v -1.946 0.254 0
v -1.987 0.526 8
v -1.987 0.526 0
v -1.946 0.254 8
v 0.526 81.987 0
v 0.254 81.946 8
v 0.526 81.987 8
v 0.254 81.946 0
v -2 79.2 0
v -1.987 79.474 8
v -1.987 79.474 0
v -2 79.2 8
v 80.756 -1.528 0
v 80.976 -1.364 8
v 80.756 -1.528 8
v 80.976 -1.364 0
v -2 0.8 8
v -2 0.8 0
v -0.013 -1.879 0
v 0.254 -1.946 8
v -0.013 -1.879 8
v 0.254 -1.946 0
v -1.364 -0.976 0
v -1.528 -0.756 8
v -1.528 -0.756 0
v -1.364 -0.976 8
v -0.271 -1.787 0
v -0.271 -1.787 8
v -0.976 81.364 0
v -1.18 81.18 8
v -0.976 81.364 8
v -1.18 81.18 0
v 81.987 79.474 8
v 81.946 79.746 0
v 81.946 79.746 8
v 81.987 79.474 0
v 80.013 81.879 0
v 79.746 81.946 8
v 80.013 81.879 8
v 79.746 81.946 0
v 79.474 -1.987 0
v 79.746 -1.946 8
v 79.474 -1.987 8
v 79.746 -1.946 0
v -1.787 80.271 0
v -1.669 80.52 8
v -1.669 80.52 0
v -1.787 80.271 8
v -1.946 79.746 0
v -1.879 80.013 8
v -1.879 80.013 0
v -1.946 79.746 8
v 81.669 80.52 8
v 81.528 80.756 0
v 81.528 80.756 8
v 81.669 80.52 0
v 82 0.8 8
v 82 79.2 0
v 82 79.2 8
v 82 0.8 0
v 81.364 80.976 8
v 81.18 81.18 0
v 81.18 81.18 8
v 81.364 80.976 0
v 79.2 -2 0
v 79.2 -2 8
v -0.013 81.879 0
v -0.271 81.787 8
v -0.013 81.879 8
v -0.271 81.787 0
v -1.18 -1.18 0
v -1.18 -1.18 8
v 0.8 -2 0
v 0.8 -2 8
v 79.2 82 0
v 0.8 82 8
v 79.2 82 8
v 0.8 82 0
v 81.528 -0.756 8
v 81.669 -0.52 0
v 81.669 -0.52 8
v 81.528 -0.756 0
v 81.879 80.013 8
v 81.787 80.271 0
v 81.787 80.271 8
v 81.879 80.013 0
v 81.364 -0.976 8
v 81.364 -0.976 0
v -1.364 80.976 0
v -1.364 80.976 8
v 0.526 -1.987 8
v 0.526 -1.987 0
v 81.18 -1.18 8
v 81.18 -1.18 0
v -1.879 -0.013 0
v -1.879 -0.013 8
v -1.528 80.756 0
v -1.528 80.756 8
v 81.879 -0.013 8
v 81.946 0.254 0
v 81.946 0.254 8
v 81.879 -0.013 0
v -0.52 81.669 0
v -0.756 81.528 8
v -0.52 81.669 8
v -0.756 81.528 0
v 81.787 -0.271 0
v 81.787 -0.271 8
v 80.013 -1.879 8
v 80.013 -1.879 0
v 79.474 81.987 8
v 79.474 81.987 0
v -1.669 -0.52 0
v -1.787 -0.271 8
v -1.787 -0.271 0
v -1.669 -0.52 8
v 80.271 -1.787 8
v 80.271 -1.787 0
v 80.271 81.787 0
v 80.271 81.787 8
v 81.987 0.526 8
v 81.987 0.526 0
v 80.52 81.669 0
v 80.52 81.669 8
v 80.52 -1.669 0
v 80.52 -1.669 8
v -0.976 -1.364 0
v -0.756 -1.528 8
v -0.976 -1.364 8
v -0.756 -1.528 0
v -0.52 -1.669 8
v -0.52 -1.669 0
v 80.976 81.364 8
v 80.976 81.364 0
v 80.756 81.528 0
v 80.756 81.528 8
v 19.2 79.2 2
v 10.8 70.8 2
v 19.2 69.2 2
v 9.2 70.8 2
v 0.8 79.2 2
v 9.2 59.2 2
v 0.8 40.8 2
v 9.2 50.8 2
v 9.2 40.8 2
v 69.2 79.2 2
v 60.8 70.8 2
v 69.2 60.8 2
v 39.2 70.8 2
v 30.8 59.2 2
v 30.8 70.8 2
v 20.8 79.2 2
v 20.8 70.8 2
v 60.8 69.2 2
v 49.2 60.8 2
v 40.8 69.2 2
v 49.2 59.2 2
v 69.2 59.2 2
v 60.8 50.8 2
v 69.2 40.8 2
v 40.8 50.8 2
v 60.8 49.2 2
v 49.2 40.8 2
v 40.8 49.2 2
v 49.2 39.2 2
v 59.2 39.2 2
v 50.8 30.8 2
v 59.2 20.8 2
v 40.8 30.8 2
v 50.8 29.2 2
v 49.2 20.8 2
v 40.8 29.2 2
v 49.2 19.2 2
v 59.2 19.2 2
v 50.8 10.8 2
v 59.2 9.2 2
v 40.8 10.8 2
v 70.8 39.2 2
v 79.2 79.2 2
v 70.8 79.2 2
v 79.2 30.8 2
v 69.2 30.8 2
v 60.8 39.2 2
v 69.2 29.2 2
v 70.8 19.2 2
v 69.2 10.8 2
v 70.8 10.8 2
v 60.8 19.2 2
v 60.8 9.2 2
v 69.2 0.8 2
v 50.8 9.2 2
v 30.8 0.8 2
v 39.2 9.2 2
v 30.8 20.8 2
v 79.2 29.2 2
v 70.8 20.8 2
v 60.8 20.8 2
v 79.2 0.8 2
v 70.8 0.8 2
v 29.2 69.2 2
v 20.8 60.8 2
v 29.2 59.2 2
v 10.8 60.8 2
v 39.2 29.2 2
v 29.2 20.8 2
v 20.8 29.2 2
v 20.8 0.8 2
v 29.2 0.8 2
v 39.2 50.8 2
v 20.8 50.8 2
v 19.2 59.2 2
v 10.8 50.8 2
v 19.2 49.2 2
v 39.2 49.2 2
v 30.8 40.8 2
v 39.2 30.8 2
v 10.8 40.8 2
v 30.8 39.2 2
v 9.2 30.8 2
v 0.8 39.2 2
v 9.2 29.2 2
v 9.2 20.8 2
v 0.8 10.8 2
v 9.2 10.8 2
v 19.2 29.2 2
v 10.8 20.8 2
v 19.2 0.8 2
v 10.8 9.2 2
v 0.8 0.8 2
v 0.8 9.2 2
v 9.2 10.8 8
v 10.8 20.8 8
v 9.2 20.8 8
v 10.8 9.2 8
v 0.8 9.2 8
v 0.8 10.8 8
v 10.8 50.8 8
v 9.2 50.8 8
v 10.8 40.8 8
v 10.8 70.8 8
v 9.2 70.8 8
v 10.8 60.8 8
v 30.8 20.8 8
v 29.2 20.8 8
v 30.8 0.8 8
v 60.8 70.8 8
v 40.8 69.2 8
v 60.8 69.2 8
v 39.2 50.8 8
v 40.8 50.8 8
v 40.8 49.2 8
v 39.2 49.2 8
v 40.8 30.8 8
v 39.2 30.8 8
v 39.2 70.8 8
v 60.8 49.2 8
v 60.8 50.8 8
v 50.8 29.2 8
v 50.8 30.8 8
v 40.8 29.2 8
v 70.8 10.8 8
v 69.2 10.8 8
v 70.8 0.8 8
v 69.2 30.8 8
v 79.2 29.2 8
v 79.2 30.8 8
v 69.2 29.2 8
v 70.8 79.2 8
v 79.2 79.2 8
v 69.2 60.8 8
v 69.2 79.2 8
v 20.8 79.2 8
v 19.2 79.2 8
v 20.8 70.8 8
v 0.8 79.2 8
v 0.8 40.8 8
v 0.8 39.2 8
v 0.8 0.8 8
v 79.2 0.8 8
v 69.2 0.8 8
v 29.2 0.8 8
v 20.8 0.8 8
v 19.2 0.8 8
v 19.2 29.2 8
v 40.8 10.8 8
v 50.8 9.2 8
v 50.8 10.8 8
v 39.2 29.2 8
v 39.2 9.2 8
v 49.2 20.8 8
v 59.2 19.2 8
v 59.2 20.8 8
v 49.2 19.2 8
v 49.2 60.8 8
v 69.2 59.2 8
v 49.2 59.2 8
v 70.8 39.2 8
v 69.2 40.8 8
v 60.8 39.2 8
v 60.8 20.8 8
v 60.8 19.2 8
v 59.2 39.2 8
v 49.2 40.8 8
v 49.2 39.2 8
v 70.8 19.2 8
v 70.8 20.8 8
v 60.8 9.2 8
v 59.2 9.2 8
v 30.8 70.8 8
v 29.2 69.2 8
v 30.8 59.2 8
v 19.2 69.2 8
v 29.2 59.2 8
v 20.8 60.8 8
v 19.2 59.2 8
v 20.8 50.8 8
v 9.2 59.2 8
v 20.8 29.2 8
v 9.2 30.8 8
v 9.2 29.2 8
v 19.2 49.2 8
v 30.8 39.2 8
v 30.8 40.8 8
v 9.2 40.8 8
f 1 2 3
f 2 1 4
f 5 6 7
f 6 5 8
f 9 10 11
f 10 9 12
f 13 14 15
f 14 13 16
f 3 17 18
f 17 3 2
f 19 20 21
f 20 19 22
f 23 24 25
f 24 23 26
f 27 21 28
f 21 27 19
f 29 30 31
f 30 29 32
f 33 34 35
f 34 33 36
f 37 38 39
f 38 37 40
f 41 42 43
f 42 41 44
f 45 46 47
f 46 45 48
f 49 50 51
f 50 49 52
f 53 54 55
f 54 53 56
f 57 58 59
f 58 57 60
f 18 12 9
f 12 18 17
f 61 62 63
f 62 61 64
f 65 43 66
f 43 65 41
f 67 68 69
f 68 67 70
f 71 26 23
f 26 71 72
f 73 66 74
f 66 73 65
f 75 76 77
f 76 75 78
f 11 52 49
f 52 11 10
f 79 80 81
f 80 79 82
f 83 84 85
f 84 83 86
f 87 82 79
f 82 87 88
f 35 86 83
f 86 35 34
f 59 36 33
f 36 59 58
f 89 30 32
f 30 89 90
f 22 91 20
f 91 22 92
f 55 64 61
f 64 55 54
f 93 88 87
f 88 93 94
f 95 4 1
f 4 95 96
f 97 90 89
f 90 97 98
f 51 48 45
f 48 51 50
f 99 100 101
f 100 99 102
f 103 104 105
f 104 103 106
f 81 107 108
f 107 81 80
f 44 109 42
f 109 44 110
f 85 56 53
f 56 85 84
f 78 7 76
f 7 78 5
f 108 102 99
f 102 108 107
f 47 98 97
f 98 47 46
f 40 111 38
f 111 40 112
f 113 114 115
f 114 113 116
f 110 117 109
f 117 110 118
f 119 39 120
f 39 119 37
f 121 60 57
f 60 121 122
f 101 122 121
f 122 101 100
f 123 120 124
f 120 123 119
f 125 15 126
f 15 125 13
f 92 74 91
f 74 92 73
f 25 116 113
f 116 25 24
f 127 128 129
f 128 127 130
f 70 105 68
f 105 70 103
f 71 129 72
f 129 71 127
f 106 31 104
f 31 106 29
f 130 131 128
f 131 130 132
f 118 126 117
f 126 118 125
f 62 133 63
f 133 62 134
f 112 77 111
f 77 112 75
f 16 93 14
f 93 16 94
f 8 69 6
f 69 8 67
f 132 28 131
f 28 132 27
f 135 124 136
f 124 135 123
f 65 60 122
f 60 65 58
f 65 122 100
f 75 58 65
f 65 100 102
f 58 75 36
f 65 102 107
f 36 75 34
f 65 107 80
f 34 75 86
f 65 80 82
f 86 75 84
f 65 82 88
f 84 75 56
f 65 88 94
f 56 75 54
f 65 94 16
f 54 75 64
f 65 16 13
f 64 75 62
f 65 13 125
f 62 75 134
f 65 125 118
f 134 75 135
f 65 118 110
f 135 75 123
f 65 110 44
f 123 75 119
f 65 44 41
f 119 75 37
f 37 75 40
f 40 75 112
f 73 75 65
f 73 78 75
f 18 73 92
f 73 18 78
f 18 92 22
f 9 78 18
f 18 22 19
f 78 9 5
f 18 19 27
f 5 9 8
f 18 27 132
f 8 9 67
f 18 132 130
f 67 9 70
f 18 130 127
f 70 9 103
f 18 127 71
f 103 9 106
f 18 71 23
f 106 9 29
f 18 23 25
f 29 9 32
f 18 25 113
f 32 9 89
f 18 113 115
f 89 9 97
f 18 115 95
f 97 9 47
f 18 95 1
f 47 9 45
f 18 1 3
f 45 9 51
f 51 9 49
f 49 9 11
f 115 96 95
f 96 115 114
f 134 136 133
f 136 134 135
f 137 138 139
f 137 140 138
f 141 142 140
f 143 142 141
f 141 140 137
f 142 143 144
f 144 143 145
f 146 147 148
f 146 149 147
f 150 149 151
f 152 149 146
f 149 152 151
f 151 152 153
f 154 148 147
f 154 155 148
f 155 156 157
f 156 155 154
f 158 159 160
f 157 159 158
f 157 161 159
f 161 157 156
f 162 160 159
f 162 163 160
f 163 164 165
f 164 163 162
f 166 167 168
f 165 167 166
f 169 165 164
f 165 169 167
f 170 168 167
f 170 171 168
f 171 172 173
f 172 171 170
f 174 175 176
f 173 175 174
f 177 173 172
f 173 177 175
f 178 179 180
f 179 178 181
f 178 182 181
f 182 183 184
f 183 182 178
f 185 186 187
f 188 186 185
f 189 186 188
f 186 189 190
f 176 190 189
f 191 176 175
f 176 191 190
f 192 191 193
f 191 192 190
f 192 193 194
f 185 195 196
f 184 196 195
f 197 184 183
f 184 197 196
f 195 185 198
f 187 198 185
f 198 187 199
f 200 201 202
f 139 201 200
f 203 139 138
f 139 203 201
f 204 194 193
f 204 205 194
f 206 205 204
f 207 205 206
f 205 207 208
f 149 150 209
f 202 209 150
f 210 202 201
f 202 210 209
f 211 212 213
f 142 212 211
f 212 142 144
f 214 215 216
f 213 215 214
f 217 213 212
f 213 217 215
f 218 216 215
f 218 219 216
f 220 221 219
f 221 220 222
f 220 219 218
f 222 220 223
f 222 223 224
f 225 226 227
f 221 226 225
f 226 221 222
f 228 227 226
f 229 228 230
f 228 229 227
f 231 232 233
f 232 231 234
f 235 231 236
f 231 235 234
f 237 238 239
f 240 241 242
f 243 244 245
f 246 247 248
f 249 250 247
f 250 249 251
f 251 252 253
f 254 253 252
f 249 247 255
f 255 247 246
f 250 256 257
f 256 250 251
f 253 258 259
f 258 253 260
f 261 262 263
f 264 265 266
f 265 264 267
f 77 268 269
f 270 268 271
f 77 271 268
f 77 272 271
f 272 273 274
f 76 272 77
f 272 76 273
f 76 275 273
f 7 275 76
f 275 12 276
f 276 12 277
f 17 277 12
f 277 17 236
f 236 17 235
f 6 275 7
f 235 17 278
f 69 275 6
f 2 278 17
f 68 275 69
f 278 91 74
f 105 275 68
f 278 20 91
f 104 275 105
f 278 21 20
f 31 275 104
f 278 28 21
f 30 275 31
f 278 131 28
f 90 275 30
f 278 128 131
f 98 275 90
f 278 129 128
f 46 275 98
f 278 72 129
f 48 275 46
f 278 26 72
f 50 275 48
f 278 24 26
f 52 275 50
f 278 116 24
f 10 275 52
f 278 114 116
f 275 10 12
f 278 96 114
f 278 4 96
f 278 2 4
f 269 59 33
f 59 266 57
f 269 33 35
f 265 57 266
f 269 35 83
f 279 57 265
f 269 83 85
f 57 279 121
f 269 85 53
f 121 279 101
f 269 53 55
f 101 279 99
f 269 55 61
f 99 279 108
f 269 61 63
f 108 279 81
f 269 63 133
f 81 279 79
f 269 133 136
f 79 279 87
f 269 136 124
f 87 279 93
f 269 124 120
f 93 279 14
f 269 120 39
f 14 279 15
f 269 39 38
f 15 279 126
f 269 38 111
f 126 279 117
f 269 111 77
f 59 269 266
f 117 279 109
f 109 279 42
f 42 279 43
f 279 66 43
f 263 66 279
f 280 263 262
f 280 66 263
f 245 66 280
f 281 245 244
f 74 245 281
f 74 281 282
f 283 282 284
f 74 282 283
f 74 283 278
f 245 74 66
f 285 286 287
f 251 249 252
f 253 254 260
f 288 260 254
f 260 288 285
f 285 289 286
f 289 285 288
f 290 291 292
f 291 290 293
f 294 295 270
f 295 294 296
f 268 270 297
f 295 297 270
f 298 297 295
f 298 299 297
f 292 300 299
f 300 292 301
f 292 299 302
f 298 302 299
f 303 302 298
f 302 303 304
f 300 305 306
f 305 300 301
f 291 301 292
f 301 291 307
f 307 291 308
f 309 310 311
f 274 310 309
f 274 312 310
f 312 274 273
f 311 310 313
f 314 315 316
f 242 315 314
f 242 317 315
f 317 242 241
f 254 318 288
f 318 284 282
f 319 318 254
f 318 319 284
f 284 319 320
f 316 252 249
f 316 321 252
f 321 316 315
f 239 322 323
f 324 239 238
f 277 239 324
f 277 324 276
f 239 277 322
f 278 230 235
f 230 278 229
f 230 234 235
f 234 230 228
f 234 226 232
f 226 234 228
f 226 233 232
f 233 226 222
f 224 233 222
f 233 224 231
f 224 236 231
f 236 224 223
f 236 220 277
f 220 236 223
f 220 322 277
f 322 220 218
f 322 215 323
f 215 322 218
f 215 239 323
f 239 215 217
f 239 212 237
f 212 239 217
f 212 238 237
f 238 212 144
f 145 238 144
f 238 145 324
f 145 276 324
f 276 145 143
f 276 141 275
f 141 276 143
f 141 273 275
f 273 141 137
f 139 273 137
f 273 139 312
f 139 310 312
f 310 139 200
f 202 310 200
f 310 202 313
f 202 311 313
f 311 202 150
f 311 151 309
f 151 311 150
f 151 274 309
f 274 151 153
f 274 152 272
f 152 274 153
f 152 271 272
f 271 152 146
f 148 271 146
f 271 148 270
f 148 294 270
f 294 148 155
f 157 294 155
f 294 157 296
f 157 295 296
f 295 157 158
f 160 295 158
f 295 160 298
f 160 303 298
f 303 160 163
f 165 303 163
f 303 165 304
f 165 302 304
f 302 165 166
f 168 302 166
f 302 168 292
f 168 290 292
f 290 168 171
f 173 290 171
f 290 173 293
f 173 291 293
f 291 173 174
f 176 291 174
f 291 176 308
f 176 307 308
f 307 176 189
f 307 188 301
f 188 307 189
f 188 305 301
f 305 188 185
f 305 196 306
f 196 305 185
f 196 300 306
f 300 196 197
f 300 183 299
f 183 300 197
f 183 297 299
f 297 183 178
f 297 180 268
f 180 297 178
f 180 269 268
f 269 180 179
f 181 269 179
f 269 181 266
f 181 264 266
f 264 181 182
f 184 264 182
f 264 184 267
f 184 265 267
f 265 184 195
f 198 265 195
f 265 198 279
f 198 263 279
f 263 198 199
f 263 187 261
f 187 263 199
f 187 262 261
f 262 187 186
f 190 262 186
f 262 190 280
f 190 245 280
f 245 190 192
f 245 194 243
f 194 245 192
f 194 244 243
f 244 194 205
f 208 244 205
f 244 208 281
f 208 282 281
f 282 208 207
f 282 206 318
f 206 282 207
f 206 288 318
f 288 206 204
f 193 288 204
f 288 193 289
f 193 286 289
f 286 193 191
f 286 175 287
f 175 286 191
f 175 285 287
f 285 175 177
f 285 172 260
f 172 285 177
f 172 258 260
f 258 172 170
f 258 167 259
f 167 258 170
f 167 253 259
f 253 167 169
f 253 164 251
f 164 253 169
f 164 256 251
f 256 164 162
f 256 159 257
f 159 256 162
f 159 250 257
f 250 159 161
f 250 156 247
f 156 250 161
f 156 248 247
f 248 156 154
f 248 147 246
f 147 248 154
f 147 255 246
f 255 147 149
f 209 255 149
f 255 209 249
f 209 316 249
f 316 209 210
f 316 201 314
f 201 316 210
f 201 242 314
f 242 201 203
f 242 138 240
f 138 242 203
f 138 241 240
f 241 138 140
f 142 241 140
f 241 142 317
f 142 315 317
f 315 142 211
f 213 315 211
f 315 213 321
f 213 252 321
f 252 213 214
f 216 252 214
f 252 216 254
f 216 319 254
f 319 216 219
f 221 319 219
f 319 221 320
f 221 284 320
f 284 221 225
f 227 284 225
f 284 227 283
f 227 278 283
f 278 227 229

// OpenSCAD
// Ball maze — a tray with a maze generated from a seed, a round start marker
// and a star finish marker inlaid in the floor. Tip the tray to roll a ball
// bearing (or a BB, or a marble) from the circle to the star.
//
// The maze is a perfect maze (every cell reachable, exactly one route between
// any two cells) made by a randomised depth-first search run inside OpenSCAD.
// The same seed always gives the same maze; change the seed for a new one.
//
// In ball_lid mode a flat lid with a snap skirt prints alongside, upside down,
// so the ball stays in. Print the lid in a clear filament to see the maze.
//
// Written to the MakerWorld Parametric Model Maker customizer conventions so
// the same file works unchanged on MakerWorld and in ScadBuddy.
//
// Colour parameters are the extruder order: floor_color is extruder 1,
// wall_color 2, marker_color 3, lid_color 4 (ball_lid mode only).

/* [Maze] */

// Number of cells across
cells_x = 8; // [4:1:15]

// Number of cells front to back
cells_y = 8; // [4:1:15]

// Maze number: each seed gives a different maze, the same seed the same maze
seed = 42; // [0:1:9999]

// Grid pitch in mm (widened automatically if the ball would not fit)
cell_size = 10; // [6:1:16]

// Outline: square, or round (the grid clipped inside a disc)
shape = "square"; // [square, round]

// Height of the maze walls above the floor
wall_height = 6; // [3:1:12]

// Thickness of the maze walls
wall_thickness = 1.6; // [1.2:0.2:3]

/* [Play] */

// Open tray, or a snap-on lid that keeps the ball in
mode = "open_tray"; // [open_tray:Open tray, ball_lid:Ball with snap-on lid]

// Ball diameter in mm; corridors are widened to fit it
ball_d = 6; // [4:0.5:12]

// Inlay a circle at the start and a star at the finish
markers = true;

/* [Colours] */

// Floor (extruder 1)
floor_color = "#80DEEA"; // color

// Maze walls and border (extruder 2)
wall_color = "#006064"; // color

// Start and finish markers (extruder 3)
marker_color = "#FFCA28"; // color

// Lid, ball_lid mode only (extruder 4)
lid_color = "#FFFFFF"; // color

/* [Hidden] */

$fn = 48;

floor_t = 2;          // floor thickness
border_extra = 1.2;   // outer border is this much thicker than a maze wall
ball_clear = 1.0;     // corridor width beyond the ball
lid_head = 0.5;       // headroom over the ball under the lid
inlay = 0.6;          // marker inlay depth
lid_t = 1.6;          // lid plate thickness
skirt_t = 1.6;        // lid skirt wall thickness
lid_fit = 0.25;       // gap between the tray border and the skirt
groove_d = 0.5;       // snap groove depth in the tray border
bead_d = 0.4;         // snap bead on the skirt (0.15 mm interference)
snap_hh = 0.6;        // half height of the groove and the bead
part_gap = 8;         // gap between tray and lid on the plate
disc_fn = 96;

// ------------------------------------------------------------ dimensions

W = cells_x;
H = cells_y;
t = wall_thickness;
min_pitch = ball_d + ball_clear + t;
p = max(cell_size, min_pitch);                       // effective pitch
c = p - t;                                           // corridor width
wh = mode == "ball_lid" ? max(wall_height, ball_d + lid_head) : wall_height;
B = t / 2 + border_extra;                            // grid line to outside
rc = B + t / 2;                                      // outer corner radius
cx = W * p / 2;
cy = H * p / 2;
R_in = min(W, H) * p / 2 + p / 4;                    // round: cell limit
R_out = R_in + B;                                    // round: outside
z_top = floor_t + wh;
skirt_h = min(4, wh - 0.4);

if (p > cell_size)
    echo(str("NOTE: cell_size widened to ", p, " mm so a ", ball_d,
             " mm ball fits the corridors"));
if (wh > wall_height)
    echo(str("NOTE: wall_height raised to ", wh, " mm so the ball clears the lid"));

// ------------------------------------------------------------ maze

// Round mode keeps a cell when its whole corridor square is inside the disc,
// at least half a wall thickness in from the edge.
function far(i, n, ctr) = max(abs(i * p + t / 2 - ctr), abs((i + 1) * p - t / 2 - ctr));
function inside(x, y) = shape != "round"
    || norm([far(x, W, cx), far(y, H, cy)]) <= R_in - t / 2;
A = [for (k = [0 : W * H - 1]) inside(k % W, floor(k / W)) ? 1 : 0];
active = [for (k = [0 : W * H - 1]) if (A[k] == 1) k];
start = active[0];
finish = active[len(active) - 1];

// Park-Miller minimal standard generator: exact in doubles, and the same on
// every OpenSCAD build (rands() is not guaranteed to be).
M = 2147483647;
function lcg(s) = (s * 16807) % M;
function mix(s, n) = n == 0 ? s : mix(lcg(s), n - 1);
s0 = mix((seed * 7919 + 104729) % (M - 1) + 1, 4);

function set(l, k, v) = [for (i = [0 : len(l) - 1]) i == k ? v : l[i]];
function pop(l) = len(l) <= 1 ? [] : [for (i = [0 : len(l) - 2]) l[i]];

function unvisited(k, vis) = let(x = k % W, y = floor(k / W)) [
    if (x + 1 < W && A[k + 1] == 1 && vis[k + 1] == 0) k + 1,
    if (x > 0     && A[k - 1] == 1 && vis[k - 1] == 0) k - 1,
    if (y + 1 < H && A[k + W] == 1 && vis[k + W] == 0) k + W,
    if (y > 0     && A[k - W] == 1 && vis[k - W] == 0) k - W
];

// E[k] = 1: open between k and k+1.  N[k] = 1: open between k and k+W.
function carve(E, N, a, b) =
      b == a + 1 ? [set(E, a, 1), N]
    : b == a - 1 ? [set(E, b, 1), N]
    : b == a + W ? [E, set(N, a, 1)]
    :              [E, set(N, b, 1)];

// Recursive backtracker with an explicit stack. Every call is a tail call, so
// OpenSCAD runs it as a loop: 2 x cells iterations, no recursion depth.
function dfs(stack, vis, E, N, s) =
    len(stack) == 0 ? [E, N]
    : let(k = stack[len(stack) - 1], nb = unvisited(k, vis))
      len(nb) == 0 ? dfs(pop(stack), vis, E, N, s)
    : let(s2 = lcg(s), n = nb[floor(s2 / M * len(nb))], en = carve(E, N, k, n))
      dfs(concat(stack, [n]), set(vis, n, 1), en[0], en[1], s2);

zeros = [for (k = [0 : W * H - 1]) 0];
maze = dfs([start], set(zeros, start, 1), zeros, zeros, s0);
E = maze[0];
N = maze[1];

// verify.sh reads this line to check the maze is perfect.
echo("MAZE", W, H, A, E, N, start, finish);

// ------------------------------------------------------------ 2D

function cell_origin(k) = [(k % W) * p + t / 2, floor(k / W) * p + t / 2];
function cell_centre(k) = cell_origin(k) + [c / 2, c / 2];

module corridors_2d() {
    for (k = active) translate(cell_origin(k)) square(c);
    // Openings: a wall-thick bridge overlapping both cells by a hair.
    for (k = active) {
        if (E[k] == 1) translate(cell_origin(k) + [c - 0.01, 0]) square([t + 0.02, c]);
        if (N[k] == 1) translate(cell_origin(k) + [0, c - 0.01]) square([c, t + 0.02]);
    }
}

// Outline of the tray. Square: corner arcs centred on the corner cells'
// inner corners, so the border is never thinner than B + t/2.
module outline_2d() {
    if (shape == "round")
        translate([cx, cy]) circle(r = R_out, $fn = disc_fn);
    else
        hull() for (x = [t / 2, W * p - t / 2], y = [t / 2, H * p - t / 2])
            translate([x, y]) circle(r = rc, $fn = 64);
}

module star_2d(r) {
    offset(r = r * 0.12) offset(delta = -r * 0.12)
        polygon([for (i = [0 : 9]) let(a = 90 + i * 36, rr = i % 2 == 0 ? r : r * 0.45)
                 [rr * cos(a), rr * sin(a)]]);
}

module markers_2d() {
    translate(cell_centre(start)) circle(d = c * 0.7);
    translate(cell_centre(finish)) star_2d(c * 0.45);
}

// ------------------------------------------------------------ snap band

module slice(z) { translate([0, 0, z - 0.005]) linear_extrude(0.01) children(); }

// The solid between the prism of the outline (grown by `grow`) and a V-shaped
// waist `d` deep, centred at zc and 2*hh tall: subtract it from the tray
// border for a groove, add it inside the skirt for a bead.
module vband(zc, hh, d, grow) {
    difference() {
        translate([0, 0, zc - hh]) linear_extrude(2 * hh) offset(r = grow) children();
        hull() { slice(zc - hh - 0.005) children(); slice(zc) offset(delta = -d) children(); }
        hull() { slice(zc) offset(delta = -d) children(); slice(zc + hh + 0.005) children(); }
    }
}

// ------------------------------------------------------------ parts

color(floor_color)
    difference() {
        linear_extrude(floor_t) outline_2d();
        if (markers) translate([0, 0, floor_t - inlay]) linear_extrude(inlay + 1) markers_2d();
    }

if (markers)
    color(marker_color)
        translate([0, 0, floor_t - inlay]) linear_extrude(inlay) markers_2d();

color(wall_color)
    difference() {
        translate([0, 0, floor_t]) linear_extrude(wh)
            difference() { outline_2d(); corridors_2d(); }
        if (mode == "ball_lid")
            vband(z_top - skirt_h / 2, snap_hh, groove_d, 1) outline_2d();
    }

// The lid prints upside down beside the tray: plate on the bed, skirt up.
o_min = shape == "round" ? cx - R_out : -B;
o_max = shape == "round" ? cx + R_out : W * p + B;
lid_dx = o_max - o_min + lid_fit + skirt_t + part_gap;

if (mode == "ball_lid")
    color(lid_color)
        translate([lid_dx, 0, 0]) {
            linear_extrude(lid_t) offset(r = lid_fit + skirt_t) outline_2d();
            translate([0, 0, lid_t - 0.01]) linear_extrude(skirt_h + 0.01)
                difference() {
                    offset(r = lid_fit + skirt_t) outline_2d();
                    offset(r = lid_fit) outline_2d();
                }
            vband(lid_t + skirt_h / 2, snap_hh, bead_d, 0.01) offset(r = lid_fit) outline_2d();
        }
